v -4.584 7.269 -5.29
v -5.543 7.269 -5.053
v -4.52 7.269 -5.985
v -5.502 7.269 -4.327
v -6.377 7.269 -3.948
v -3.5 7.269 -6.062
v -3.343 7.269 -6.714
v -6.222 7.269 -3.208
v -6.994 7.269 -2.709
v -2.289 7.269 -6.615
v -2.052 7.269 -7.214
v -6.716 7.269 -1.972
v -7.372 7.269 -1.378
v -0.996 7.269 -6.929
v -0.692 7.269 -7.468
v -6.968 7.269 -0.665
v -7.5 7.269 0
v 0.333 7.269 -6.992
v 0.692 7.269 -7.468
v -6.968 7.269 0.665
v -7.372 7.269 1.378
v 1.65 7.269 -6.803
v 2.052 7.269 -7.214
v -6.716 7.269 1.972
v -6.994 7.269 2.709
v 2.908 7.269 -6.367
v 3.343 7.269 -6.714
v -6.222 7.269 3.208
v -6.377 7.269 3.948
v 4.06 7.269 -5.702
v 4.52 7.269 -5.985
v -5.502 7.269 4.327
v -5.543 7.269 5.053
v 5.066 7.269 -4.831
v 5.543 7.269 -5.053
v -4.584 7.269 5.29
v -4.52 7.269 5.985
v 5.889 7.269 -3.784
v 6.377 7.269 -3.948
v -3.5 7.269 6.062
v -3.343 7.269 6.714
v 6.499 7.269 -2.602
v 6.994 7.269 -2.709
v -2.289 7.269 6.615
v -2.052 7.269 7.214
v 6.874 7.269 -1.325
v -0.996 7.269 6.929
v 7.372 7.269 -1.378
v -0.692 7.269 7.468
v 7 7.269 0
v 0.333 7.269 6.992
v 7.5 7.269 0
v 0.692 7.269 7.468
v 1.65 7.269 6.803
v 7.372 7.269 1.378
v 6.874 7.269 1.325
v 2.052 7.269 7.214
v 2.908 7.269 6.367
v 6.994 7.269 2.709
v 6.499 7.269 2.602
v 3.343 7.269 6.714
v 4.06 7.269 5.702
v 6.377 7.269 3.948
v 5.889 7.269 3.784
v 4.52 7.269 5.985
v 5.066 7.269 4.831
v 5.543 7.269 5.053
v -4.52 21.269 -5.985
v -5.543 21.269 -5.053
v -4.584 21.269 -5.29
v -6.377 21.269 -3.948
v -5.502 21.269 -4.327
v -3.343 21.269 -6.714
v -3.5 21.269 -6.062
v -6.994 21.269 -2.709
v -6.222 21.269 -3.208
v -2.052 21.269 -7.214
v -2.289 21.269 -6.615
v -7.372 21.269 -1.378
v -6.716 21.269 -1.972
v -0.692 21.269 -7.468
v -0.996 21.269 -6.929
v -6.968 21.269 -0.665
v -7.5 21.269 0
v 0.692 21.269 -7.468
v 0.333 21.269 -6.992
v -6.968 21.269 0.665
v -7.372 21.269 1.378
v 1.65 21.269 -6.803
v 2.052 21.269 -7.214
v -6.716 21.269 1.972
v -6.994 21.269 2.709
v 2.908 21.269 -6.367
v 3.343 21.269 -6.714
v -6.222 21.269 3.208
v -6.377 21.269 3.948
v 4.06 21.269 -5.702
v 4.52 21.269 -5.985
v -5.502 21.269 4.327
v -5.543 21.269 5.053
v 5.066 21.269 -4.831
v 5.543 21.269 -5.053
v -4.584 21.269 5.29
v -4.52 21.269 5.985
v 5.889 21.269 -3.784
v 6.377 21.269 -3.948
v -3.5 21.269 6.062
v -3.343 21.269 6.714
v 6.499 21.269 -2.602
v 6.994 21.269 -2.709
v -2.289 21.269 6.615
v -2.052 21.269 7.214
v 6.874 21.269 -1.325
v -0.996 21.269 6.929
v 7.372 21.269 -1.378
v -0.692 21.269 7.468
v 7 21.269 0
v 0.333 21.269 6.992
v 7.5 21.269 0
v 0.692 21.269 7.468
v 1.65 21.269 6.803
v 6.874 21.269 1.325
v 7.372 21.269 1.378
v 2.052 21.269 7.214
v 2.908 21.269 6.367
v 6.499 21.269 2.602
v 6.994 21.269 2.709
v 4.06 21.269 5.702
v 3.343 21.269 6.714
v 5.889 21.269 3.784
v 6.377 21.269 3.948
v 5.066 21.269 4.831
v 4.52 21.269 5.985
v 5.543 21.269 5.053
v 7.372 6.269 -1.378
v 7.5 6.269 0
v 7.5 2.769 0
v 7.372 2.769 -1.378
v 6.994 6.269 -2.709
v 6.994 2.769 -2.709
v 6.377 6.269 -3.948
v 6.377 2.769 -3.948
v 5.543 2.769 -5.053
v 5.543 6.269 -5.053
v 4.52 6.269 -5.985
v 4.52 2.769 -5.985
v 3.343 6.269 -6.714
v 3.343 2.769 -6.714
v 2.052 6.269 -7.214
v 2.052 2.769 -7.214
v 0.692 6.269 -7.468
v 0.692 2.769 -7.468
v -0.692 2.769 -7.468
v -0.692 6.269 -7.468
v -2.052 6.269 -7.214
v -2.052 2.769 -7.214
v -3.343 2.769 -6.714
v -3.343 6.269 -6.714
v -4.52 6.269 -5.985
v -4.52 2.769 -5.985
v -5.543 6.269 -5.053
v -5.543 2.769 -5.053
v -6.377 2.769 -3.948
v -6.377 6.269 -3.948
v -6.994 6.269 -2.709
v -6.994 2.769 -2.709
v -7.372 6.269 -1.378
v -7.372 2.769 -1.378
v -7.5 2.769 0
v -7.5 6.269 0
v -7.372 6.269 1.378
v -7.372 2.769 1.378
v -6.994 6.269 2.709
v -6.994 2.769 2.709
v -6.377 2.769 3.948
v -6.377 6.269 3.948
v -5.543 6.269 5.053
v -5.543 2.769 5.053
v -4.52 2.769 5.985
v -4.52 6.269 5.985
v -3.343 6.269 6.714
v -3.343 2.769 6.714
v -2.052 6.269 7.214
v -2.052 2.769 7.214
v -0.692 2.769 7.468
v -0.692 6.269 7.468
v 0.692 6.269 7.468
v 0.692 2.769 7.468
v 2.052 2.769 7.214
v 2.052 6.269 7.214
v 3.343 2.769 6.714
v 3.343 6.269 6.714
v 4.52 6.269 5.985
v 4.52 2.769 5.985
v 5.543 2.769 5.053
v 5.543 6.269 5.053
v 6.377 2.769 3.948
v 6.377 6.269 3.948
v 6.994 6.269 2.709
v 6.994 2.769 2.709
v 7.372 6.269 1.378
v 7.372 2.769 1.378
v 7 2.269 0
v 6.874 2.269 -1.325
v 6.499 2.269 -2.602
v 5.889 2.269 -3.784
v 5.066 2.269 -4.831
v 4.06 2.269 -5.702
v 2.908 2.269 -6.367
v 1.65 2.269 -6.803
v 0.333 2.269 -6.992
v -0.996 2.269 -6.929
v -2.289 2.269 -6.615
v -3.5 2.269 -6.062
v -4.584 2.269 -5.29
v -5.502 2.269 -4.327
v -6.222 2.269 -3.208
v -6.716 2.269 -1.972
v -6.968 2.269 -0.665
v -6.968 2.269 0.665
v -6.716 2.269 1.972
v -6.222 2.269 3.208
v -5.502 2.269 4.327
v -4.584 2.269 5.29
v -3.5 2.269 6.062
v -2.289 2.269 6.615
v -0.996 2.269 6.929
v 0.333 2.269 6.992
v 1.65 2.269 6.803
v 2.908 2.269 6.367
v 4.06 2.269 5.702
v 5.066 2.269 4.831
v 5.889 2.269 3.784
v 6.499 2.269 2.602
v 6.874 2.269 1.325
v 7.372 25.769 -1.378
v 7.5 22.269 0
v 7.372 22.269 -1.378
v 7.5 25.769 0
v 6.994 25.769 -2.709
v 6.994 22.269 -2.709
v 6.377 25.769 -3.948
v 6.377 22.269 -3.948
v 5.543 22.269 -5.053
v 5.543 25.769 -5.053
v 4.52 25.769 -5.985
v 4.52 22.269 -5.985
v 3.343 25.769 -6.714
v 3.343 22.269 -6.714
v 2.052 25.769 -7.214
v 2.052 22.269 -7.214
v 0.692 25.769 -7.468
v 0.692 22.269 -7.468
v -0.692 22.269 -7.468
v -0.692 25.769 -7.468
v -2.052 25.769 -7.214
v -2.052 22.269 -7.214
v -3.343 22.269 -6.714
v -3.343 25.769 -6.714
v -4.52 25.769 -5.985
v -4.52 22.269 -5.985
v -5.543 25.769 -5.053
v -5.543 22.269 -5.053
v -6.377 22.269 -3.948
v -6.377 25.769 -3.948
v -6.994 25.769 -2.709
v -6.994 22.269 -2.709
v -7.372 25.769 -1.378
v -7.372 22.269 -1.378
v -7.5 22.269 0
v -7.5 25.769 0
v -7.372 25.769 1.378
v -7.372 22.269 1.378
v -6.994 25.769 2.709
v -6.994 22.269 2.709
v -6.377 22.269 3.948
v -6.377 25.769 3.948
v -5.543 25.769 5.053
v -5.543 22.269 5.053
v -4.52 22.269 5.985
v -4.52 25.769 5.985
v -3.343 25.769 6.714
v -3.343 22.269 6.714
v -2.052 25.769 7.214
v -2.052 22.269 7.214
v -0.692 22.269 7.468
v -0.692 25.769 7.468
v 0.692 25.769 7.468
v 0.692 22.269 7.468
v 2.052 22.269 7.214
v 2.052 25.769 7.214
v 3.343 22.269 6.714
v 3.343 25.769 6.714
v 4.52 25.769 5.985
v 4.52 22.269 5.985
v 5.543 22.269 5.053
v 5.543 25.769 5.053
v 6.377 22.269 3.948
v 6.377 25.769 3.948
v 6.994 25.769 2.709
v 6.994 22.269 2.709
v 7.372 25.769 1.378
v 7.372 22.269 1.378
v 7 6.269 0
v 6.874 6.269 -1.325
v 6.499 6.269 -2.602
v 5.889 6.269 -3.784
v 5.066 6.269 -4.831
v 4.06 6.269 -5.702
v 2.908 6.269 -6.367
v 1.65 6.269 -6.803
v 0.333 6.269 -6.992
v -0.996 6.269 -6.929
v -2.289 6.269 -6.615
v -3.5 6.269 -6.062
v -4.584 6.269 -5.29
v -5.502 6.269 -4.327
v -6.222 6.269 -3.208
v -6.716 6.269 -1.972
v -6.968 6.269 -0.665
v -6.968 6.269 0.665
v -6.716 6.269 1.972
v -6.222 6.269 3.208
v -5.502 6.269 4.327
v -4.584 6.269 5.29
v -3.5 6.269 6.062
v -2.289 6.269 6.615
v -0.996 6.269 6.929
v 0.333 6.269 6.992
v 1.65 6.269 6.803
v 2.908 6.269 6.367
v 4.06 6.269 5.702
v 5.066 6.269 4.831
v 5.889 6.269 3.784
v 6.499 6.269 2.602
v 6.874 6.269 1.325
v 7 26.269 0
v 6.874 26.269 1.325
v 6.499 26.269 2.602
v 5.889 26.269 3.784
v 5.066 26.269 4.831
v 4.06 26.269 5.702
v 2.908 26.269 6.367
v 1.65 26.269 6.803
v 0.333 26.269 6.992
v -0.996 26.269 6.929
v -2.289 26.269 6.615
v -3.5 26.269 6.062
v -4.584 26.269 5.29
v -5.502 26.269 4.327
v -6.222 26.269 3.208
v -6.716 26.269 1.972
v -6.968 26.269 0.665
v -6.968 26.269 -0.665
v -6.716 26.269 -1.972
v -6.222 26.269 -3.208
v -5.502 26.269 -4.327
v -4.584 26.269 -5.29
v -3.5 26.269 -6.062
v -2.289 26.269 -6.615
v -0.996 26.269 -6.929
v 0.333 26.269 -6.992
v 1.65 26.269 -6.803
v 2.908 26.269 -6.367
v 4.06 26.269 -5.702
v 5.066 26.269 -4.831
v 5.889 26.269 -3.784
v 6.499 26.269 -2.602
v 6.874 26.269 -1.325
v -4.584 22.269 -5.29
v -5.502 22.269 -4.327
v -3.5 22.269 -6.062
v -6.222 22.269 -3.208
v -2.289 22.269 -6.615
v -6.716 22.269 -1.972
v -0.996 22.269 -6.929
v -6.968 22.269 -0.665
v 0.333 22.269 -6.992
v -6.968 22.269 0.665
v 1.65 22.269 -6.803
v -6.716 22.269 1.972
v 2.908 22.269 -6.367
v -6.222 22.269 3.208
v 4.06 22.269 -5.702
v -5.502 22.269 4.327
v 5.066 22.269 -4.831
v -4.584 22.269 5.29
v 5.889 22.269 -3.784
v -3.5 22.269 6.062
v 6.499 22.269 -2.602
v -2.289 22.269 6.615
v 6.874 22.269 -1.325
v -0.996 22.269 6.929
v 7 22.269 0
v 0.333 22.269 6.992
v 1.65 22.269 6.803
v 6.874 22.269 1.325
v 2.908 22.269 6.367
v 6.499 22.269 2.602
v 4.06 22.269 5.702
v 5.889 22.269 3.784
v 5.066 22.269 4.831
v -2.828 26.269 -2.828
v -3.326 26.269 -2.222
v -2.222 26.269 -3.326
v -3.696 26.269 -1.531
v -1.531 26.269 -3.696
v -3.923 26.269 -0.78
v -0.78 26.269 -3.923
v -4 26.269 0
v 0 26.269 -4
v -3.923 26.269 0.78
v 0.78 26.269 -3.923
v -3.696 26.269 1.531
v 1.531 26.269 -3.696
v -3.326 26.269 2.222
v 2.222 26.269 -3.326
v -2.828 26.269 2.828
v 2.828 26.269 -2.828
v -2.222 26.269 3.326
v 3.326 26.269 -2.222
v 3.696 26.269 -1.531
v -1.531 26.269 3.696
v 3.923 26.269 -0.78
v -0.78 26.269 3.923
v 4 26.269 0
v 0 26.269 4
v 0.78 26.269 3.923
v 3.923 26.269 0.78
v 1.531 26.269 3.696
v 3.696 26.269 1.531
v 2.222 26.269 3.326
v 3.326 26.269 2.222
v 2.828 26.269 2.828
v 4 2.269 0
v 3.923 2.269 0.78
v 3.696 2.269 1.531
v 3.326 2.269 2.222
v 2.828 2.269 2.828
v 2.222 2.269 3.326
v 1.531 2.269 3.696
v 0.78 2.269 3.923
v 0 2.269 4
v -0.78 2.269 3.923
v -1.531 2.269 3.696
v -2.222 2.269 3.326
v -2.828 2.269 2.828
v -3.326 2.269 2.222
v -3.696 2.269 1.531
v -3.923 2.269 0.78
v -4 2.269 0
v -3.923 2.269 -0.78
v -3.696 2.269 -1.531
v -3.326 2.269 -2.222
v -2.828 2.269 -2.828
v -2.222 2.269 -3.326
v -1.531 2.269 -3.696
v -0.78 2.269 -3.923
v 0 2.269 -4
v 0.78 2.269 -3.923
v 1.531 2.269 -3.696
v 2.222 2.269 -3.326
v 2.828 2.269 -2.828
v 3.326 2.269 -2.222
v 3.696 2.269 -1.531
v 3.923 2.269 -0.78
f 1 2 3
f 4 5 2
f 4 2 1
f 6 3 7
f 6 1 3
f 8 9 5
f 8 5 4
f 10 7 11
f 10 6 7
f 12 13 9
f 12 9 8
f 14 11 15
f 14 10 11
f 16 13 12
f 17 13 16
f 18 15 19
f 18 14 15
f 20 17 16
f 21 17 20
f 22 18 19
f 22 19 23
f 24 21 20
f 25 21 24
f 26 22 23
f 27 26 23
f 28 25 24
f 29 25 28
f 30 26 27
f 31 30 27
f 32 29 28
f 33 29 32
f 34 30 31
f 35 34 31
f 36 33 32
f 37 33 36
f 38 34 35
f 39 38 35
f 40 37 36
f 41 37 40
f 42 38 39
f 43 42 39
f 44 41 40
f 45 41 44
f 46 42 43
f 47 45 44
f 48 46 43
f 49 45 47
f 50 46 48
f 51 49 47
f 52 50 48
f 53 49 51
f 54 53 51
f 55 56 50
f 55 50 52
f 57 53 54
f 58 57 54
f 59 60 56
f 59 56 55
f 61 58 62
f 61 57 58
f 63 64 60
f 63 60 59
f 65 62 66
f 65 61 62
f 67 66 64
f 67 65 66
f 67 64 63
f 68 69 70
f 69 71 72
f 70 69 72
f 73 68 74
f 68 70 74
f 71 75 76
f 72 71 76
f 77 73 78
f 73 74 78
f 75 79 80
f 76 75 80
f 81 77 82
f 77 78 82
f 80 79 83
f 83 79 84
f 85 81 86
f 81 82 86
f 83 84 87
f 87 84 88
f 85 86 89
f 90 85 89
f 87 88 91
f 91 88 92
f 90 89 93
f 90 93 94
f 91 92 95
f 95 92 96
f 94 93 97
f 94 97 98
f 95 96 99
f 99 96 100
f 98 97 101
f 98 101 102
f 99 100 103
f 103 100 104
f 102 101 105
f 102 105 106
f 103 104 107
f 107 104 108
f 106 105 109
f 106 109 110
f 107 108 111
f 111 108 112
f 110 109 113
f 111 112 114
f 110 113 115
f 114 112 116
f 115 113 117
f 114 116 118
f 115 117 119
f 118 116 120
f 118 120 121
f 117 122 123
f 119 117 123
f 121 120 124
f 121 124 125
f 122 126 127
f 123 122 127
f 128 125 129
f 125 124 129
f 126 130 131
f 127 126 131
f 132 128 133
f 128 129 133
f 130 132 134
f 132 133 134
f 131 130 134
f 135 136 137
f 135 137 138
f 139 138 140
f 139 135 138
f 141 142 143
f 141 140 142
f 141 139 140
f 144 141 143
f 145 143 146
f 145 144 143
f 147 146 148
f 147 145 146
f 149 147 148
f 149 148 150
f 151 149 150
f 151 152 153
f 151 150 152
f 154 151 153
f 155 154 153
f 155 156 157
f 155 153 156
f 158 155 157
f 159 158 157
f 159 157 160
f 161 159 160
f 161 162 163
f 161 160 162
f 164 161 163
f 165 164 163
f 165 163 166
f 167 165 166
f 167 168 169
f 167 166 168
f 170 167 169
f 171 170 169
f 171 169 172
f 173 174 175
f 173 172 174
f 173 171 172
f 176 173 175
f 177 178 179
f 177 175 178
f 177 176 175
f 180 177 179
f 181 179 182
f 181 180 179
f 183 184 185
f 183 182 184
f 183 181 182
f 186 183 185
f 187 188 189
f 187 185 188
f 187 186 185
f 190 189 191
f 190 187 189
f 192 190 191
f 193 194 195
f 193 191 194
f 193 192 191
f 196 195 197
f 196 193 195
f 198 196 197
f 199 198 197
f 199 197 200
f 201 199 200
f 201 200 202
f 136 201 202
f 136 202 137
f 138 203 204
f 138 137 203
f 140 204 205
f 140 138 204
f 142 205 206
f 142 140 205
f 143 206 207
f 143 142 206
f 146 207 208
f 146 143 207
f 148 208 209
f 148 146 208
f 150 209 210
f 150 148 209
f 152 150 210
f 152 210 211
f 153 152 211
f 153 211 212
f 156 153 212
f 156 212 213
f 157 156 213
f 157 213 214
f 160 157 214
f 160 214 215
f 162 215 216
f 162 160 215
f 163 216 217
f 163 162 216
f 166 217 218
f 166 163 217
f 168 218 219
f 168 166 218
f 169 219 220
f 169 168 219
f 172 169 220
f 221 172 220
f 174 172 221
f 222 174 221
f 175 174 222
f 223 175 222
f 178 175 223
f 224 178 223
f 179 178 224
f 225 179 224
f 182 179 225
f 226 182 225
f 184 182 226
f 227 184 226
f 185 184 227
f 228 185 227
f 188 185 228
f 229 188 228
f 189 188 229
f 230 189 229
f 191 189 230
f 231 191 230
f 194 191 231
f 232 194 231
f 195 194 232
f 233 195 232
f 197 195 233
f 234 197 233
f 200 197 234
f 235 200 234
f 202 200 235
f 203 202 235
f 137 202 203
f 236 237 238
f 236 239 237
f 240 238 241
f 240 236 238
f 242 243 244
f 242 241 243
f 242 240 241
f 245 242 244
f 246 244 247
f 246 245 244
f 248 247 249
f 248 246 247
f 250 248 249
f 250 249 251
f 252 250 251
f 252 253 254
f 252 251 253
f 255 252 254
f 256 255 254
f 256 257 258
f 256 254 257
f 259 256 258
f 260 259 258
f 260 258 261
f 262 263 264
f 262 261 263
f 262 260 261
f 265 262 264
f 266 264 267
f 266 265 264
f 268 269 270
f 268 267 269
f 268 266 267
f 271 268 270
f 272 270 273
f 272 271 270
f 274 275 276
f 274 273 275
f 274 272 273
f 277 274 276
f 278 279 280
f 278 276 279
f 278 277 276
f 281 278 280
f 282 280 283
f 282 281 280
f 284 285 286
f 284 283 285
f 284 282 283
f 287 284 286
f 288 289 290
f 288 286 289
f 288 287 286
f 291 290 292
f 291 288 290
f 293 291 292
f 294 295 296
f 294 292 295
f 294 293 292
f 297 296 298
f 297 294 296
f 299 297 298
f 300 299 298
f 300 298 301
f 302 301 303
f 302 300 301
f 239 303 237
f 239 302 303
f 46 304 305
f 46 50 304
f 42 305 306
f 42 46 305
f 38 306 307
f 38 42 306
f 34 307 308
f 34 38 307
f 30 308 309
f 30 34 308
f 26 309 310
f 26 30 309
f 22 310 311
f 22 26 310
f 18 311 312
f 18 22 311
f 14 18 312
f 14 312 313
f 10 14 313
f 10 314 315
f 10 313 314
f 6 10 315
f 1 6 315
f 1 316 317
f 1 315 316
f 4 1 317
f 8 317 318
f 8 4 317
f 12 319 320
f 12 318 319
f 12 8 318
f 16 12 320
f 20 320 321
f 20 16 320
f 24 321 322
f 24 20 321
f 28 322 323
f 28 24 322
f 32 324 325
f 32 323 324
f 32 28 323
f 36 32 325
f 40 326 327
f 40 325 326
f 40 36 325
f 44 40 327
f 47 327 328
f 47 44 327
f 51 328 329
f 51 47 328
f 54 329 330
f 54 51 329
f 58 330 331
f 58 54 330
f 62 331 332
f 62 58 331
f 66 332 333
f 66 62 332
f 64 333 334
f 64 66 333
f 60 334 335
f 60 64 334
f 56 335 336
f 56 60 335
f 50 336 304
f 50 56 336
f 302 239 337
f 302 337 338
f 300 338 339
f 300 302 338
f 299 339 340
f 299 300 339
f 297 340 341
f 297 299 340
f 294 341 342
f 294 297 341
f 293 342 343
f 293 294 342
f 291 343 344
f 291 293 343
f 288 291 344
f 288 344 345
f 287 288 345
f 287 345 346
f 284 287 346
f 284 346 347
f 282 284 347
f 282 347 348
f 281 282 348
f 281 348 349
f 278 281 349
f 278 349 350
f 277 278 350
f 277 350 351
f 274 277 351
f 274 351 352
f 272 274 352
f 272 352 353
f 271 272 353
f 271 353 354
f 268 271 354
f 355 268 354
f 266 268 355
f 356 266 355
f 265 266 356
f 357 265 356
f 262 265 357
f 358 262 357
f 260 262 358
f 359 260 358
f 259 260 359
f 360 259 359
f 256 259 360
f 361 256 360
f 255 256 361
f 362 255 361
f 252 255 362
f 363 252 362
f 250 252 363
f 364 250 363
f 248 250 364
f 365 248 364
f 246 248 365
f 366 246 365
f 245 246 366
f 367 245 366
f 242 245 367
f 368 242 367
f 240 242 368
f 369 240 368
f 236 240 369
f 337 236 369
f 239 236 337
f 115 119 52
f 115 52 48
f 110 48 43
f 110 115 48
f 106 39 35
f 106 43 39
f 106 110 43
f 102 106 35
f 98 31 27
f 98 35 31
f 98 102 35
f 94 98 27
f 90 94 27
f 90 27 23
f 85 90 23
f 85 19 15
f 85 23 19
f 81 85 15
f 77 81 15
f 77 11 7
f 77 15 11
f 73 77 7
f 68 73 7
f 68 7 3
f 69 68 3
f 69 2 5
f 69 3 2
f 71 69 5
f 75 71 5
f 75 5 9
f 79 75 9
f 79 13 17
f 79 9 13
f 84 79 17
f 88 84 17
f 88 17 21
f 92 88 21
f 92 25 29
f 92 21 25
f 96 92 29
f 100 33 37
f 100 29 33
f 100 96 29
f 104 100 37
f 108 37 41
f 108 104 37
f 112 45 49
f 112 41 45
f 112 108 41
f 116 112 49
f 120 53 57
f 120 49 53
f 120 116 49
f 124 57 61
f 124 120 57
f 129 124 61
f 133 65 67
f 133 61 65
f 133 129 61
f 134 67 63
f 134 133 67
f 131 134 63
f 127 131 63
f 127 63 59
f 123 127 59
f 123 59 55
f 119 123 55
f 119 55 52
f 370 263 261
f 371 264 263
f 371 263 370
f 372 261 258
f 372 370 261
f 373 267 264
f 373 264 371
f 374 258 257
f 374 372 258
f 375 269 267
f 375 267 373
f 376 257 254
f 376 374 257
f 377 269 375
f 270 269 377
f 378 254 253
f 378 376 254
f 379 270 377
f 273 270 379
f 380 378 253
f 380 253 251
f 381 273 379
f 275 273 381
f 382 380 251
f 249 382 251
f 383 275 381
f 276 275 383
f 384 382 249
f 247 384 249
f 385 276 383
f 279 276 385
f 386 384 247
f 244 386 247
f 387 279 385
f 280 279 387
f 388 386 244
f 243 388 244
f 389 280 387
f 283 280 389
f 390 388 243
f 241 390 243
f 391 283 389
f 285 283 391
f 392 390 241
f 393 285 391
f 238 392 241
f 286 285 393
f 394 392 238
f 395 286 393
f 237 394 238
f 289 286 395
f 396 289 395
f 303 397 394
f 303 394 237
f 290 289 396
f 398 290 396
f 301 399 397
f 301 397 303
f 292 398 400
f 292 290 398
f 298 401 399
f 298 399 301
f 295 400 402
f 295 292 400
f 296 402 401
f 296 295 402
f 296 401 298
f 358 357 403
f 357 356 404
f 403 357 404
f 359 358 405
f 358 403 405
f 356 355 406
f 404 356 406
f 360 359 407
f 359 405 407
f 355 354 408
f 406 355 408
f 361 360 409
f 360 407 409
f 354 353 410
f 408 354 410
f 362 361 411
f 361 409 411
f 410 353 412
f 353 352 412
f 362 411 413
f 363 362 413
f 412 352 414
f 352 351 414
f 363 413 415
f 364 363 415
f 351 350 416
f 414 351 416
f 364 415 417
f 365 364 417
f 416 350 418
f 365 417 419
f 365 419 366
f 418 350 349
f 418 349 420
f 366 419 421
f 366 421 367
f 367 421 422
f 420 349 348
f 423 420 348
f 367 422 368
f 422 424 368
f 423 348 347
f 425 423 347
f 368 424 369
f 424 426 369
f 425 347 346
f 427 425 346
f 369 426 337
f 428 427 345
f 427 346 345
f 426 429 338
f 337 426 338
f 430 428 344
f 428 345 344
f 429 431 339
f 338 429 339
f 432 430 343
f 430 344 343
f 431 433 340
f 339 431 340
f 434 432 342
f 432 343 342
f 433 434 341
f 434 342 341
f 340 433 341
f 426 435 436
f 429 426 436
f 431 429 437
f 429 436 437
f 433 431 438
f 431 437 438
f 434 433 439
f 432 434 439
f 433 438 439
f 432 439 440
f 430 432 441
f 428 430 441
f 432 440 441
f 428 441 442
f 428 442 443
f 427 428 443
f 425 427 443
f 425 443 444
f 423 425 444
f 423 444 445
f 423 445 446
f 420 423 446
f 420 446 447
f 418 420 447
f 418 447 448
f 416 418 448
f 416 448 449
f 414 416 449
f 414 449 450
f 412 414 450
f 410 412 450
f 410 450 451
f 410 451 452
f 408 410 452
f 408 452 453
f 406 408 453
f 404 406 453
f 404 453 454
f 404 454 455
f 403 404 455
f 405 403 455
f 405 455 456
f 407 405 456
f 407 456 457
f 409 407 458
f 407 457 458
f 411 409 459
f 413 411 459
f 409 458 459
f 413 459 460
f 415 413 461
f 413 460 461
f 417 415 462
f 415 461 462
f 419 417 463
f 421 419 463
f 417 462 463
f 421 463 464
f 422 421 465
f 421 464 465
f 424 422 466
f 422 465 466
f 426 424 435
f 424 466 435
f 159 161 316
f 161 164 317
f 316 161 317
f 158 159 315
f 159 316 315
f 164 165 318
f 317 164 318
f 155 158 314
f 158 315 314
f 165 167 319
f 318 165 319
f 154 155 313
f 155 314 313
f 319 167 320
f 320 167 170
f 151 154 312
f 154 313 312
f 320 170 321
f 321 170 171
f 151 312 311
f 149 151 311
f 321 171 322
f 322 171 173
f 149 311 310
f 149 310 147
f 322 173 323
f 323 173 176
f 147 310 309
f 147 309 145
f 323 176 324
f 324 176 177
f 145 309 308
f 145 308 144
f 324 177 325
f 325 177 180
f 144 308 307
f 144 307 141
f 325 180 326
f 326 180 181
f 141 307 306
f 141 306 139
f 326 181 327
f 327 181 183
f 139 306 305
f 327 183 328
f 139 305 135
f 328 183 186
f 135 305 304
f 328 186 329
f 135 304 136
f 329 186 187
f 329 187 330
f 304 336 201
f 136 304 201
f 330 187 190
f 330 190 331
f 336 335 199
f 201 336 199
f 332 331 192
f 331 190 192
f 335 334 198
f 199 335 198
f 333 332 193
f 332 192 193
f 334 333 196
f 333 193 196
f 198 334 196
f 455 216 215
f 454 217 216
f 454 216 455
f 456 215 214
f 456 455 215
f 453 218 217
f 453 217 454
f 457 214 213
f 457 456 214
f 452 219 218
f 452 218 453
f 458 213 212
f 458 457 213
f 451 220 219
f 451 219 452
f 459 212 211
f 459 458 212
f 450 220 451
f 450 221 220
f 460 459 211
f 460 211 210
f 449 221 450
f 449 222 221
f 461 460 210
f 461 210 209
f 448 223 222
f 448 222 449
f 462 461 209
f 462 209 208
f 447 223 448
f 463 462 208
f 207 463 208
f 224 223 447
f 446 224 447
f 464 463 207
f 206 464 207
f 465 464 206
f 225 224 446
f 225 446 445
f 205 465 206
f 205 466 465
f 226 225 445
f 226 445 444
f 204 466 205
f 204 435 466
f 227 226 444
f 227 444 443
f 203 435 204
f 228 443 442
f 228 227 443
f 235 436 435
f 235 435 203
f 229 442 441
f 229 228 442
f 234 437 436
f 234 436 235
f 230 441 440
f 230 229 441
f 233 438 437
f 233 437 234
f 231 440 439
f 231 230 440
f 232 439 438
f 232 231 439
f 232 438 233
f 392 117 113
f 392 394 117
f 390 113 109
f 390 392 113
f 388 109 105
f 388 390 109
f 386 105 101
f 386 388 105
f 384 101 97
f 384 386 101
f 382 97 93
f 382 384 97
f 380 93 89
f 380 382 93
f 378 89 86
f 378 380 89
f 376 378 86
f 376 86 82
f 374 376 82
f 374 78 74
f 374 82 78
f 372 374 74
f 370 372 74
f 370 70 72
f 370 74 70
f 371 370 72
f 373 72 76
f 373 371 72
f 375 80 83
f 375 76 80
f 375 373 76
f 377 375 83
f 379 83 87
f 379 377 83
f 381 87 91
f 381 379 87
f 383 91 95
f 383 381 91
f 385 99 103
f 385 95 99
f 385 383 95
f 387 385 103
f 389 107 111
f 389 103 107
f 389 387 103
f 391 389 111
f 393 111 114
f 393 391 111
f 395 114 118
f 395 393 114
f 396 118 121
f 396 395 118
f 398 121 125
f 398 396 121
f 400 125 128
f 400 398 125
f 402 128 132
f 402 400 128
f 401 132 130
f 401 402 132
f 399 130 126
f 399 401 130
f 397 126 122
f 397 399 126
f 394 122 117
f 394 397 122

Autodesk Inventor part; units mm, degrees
ref_plane "YZ Plane" through (0, 0, 0) normal (1, 0, 0) x (0, 1, 0)
ref_plane "XZ Plane" through (0, 0, 0) normal (0, 1, 0) x (-1, 0, 0)
ref_plane "XY Plane" through (0, 0, 0) normal (0, 0, 1) x (1, 0, 0)
sketch "Sketch1" plane through (0, 0, 0) normal (0, 0, 1) x (1, 0, 0)
  line L0 (0, 21.9424) -> (0, -17.6259)
  line L1 (4, 26.2687) -> (4, 2.2687)
  line L2 (4, 2.2687) -> (7, 2.2687)
  line L3 (7, 2.2687) -> (7.5, 2.7687)
  line L4 (7.5, 2.7687) -> (7.5, 6.2687)
  line L5 (7.5, 6.2687) -> (7, 6.2687)
  line L6 (7, 6.2687) -> (7, 7.2687)
  line L7 (7, 7.2687) -> (7.5, 7.2687)
  line L8 (7.5, 7.2687) -> (7.5, 21.2687)
  line L9 (7.5, 21.2687) -> (7, 21.2687)
  line L10 (7, 21.2687) -> (7, 22.2687)
  line L11 (7, 22.2687) -> (7.5, 22.2687)
  line L12 (7.5, 22.2687) -> (7.5, 25.7687)
  line L13 (7.5, 25.7687) -> (7, 26.2687)
  line L14 (7, 26.2687) -> (4, 26.2687)
  dimension "d1" = 1
  dimension "d2" = 1
  dimension "d3" = 0.5
  dimension "d4" = 0.5
  dimension "d5" = 0.5
  dimension "d6" = 0.5
  dimension "d7" = 24
  dimension "d8" = 8
  dimension "d9" = 15
  dimension "d10" = 4
  dimension "d11" = 4
  dimension "d12" = 0.5
revolve "Revolution1" add sketch "Sketch1" angle 360 about axis through (0, 21.9424, 0) along (0, -1, 0)
properties part number "lm8uu"
